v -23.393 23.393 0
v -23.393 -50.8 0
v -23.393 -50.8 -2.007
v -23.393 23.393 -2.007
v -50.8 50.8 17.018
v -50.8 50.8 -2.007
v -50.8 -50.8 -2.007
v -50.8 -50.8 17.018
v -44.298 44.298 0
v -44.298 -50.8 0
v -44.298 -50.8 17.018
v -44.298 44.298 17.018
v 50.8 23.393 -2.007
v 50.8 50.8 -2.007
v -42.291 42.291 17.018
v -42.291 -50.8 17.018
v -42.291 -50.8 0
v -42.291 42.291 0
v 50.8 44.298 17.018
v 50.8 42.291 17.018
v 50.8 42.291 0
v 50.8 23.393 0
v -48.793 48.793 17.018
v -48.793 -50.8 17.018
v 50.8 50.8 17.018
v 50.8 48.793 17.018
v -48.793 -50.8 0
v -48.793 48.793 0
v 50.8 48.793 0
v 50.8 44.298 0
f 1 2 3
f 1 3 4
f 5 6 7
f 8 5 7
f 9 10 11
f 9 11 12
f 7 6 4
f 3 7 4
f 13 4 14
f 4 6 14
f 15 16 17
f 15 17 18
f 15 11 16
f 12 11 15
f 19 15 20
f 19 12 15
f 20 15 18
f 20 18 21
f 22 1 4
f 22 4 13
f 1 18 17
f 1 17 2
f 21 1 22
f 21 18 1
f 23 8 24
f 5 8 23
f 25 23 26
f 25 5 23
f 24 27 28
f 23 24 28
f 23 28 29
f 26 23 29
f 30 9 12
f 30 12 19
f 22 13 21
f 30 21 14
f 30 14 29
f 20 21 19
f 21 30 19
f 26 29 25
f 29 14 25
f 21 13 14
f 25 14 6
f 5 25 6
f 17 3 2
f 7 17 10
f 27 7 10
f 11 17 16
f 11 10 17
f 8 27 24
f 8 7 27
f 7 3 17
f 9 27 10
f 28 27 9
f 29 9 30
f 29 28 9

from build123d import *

# Parameters (mm, degrees)
F0_W      = 101.6
F0_H      = 101.6
F1_DEPTH  = 2.0066
F3_DEPTH  = 17.018
F4_W      = 95.0976
F4_H      = 95.0976
F5_DEPTH  = 17.018
F6_W      = 93.091
F6_H      = 93.091
F7_DEPTH  = 19.0256
F8_W      = 93.091
F8_H      = 2.0066
F9_DEPTH  = 18.8976
F10_W     = 74.1934
F10_H     = 2.0066
F11_DEPTH = 18.8976


with BuildPart() as f1:
    # F0 (on Top) → F1 (new body)
    with BuildSketch(Plane.XY):
        Rectangle(F0_W, F0_H)
    extrude(amount=-F1_DEPTH)

    # F2 (on face) → F3 (join)
    with BuildSketch(Plane.XY):
        Polygon((-50.8, -50.8), (-48.7934, -50.8), (-48.7934, 48.7934), (50.8, 48.7934), (50.8, 50.8), (-50.8, 50.8), align=None)
    extrude(amount=F3_DEPTH)

    # F4 (on face) → F5 (join, through all)
    with BuildSketch(Plane.XY):
        with Locations((3.2512, -3.2512)):
            Rectangle(F4_W, F4_H)
    extrude(amount=F5_DEPTH)

    # F6 (on face) → F7 (cut, through all)
    with BuildSketch(Plane.XY.offset(17.018)):
        with Locations((4.2545, -4.2545)):
            Rectangle(F6_W, F6_H)
    extrude(amount=-F7_DEPTH, mode=Mode.SUBTRACT)

    # F8 (on face) → F9 (join)
    with BuildSketch(Plane.YZ.offset(-42.291)):
        with Locations((-4.2545, -1.0033)):
            Rectangle(F8_W, F8_H)
    extrude(amount=F9_DEPTH)

    # F10 (on face) → F11 (join)
    with BuildSketch(Plane.XZ.offset(-42.291)):
        with Locations((13.7033, -1.0033)):
            Rectangle(F10_W, F10_H)
    extrude(amount=F11_DEPTH)


solid = f1.part
